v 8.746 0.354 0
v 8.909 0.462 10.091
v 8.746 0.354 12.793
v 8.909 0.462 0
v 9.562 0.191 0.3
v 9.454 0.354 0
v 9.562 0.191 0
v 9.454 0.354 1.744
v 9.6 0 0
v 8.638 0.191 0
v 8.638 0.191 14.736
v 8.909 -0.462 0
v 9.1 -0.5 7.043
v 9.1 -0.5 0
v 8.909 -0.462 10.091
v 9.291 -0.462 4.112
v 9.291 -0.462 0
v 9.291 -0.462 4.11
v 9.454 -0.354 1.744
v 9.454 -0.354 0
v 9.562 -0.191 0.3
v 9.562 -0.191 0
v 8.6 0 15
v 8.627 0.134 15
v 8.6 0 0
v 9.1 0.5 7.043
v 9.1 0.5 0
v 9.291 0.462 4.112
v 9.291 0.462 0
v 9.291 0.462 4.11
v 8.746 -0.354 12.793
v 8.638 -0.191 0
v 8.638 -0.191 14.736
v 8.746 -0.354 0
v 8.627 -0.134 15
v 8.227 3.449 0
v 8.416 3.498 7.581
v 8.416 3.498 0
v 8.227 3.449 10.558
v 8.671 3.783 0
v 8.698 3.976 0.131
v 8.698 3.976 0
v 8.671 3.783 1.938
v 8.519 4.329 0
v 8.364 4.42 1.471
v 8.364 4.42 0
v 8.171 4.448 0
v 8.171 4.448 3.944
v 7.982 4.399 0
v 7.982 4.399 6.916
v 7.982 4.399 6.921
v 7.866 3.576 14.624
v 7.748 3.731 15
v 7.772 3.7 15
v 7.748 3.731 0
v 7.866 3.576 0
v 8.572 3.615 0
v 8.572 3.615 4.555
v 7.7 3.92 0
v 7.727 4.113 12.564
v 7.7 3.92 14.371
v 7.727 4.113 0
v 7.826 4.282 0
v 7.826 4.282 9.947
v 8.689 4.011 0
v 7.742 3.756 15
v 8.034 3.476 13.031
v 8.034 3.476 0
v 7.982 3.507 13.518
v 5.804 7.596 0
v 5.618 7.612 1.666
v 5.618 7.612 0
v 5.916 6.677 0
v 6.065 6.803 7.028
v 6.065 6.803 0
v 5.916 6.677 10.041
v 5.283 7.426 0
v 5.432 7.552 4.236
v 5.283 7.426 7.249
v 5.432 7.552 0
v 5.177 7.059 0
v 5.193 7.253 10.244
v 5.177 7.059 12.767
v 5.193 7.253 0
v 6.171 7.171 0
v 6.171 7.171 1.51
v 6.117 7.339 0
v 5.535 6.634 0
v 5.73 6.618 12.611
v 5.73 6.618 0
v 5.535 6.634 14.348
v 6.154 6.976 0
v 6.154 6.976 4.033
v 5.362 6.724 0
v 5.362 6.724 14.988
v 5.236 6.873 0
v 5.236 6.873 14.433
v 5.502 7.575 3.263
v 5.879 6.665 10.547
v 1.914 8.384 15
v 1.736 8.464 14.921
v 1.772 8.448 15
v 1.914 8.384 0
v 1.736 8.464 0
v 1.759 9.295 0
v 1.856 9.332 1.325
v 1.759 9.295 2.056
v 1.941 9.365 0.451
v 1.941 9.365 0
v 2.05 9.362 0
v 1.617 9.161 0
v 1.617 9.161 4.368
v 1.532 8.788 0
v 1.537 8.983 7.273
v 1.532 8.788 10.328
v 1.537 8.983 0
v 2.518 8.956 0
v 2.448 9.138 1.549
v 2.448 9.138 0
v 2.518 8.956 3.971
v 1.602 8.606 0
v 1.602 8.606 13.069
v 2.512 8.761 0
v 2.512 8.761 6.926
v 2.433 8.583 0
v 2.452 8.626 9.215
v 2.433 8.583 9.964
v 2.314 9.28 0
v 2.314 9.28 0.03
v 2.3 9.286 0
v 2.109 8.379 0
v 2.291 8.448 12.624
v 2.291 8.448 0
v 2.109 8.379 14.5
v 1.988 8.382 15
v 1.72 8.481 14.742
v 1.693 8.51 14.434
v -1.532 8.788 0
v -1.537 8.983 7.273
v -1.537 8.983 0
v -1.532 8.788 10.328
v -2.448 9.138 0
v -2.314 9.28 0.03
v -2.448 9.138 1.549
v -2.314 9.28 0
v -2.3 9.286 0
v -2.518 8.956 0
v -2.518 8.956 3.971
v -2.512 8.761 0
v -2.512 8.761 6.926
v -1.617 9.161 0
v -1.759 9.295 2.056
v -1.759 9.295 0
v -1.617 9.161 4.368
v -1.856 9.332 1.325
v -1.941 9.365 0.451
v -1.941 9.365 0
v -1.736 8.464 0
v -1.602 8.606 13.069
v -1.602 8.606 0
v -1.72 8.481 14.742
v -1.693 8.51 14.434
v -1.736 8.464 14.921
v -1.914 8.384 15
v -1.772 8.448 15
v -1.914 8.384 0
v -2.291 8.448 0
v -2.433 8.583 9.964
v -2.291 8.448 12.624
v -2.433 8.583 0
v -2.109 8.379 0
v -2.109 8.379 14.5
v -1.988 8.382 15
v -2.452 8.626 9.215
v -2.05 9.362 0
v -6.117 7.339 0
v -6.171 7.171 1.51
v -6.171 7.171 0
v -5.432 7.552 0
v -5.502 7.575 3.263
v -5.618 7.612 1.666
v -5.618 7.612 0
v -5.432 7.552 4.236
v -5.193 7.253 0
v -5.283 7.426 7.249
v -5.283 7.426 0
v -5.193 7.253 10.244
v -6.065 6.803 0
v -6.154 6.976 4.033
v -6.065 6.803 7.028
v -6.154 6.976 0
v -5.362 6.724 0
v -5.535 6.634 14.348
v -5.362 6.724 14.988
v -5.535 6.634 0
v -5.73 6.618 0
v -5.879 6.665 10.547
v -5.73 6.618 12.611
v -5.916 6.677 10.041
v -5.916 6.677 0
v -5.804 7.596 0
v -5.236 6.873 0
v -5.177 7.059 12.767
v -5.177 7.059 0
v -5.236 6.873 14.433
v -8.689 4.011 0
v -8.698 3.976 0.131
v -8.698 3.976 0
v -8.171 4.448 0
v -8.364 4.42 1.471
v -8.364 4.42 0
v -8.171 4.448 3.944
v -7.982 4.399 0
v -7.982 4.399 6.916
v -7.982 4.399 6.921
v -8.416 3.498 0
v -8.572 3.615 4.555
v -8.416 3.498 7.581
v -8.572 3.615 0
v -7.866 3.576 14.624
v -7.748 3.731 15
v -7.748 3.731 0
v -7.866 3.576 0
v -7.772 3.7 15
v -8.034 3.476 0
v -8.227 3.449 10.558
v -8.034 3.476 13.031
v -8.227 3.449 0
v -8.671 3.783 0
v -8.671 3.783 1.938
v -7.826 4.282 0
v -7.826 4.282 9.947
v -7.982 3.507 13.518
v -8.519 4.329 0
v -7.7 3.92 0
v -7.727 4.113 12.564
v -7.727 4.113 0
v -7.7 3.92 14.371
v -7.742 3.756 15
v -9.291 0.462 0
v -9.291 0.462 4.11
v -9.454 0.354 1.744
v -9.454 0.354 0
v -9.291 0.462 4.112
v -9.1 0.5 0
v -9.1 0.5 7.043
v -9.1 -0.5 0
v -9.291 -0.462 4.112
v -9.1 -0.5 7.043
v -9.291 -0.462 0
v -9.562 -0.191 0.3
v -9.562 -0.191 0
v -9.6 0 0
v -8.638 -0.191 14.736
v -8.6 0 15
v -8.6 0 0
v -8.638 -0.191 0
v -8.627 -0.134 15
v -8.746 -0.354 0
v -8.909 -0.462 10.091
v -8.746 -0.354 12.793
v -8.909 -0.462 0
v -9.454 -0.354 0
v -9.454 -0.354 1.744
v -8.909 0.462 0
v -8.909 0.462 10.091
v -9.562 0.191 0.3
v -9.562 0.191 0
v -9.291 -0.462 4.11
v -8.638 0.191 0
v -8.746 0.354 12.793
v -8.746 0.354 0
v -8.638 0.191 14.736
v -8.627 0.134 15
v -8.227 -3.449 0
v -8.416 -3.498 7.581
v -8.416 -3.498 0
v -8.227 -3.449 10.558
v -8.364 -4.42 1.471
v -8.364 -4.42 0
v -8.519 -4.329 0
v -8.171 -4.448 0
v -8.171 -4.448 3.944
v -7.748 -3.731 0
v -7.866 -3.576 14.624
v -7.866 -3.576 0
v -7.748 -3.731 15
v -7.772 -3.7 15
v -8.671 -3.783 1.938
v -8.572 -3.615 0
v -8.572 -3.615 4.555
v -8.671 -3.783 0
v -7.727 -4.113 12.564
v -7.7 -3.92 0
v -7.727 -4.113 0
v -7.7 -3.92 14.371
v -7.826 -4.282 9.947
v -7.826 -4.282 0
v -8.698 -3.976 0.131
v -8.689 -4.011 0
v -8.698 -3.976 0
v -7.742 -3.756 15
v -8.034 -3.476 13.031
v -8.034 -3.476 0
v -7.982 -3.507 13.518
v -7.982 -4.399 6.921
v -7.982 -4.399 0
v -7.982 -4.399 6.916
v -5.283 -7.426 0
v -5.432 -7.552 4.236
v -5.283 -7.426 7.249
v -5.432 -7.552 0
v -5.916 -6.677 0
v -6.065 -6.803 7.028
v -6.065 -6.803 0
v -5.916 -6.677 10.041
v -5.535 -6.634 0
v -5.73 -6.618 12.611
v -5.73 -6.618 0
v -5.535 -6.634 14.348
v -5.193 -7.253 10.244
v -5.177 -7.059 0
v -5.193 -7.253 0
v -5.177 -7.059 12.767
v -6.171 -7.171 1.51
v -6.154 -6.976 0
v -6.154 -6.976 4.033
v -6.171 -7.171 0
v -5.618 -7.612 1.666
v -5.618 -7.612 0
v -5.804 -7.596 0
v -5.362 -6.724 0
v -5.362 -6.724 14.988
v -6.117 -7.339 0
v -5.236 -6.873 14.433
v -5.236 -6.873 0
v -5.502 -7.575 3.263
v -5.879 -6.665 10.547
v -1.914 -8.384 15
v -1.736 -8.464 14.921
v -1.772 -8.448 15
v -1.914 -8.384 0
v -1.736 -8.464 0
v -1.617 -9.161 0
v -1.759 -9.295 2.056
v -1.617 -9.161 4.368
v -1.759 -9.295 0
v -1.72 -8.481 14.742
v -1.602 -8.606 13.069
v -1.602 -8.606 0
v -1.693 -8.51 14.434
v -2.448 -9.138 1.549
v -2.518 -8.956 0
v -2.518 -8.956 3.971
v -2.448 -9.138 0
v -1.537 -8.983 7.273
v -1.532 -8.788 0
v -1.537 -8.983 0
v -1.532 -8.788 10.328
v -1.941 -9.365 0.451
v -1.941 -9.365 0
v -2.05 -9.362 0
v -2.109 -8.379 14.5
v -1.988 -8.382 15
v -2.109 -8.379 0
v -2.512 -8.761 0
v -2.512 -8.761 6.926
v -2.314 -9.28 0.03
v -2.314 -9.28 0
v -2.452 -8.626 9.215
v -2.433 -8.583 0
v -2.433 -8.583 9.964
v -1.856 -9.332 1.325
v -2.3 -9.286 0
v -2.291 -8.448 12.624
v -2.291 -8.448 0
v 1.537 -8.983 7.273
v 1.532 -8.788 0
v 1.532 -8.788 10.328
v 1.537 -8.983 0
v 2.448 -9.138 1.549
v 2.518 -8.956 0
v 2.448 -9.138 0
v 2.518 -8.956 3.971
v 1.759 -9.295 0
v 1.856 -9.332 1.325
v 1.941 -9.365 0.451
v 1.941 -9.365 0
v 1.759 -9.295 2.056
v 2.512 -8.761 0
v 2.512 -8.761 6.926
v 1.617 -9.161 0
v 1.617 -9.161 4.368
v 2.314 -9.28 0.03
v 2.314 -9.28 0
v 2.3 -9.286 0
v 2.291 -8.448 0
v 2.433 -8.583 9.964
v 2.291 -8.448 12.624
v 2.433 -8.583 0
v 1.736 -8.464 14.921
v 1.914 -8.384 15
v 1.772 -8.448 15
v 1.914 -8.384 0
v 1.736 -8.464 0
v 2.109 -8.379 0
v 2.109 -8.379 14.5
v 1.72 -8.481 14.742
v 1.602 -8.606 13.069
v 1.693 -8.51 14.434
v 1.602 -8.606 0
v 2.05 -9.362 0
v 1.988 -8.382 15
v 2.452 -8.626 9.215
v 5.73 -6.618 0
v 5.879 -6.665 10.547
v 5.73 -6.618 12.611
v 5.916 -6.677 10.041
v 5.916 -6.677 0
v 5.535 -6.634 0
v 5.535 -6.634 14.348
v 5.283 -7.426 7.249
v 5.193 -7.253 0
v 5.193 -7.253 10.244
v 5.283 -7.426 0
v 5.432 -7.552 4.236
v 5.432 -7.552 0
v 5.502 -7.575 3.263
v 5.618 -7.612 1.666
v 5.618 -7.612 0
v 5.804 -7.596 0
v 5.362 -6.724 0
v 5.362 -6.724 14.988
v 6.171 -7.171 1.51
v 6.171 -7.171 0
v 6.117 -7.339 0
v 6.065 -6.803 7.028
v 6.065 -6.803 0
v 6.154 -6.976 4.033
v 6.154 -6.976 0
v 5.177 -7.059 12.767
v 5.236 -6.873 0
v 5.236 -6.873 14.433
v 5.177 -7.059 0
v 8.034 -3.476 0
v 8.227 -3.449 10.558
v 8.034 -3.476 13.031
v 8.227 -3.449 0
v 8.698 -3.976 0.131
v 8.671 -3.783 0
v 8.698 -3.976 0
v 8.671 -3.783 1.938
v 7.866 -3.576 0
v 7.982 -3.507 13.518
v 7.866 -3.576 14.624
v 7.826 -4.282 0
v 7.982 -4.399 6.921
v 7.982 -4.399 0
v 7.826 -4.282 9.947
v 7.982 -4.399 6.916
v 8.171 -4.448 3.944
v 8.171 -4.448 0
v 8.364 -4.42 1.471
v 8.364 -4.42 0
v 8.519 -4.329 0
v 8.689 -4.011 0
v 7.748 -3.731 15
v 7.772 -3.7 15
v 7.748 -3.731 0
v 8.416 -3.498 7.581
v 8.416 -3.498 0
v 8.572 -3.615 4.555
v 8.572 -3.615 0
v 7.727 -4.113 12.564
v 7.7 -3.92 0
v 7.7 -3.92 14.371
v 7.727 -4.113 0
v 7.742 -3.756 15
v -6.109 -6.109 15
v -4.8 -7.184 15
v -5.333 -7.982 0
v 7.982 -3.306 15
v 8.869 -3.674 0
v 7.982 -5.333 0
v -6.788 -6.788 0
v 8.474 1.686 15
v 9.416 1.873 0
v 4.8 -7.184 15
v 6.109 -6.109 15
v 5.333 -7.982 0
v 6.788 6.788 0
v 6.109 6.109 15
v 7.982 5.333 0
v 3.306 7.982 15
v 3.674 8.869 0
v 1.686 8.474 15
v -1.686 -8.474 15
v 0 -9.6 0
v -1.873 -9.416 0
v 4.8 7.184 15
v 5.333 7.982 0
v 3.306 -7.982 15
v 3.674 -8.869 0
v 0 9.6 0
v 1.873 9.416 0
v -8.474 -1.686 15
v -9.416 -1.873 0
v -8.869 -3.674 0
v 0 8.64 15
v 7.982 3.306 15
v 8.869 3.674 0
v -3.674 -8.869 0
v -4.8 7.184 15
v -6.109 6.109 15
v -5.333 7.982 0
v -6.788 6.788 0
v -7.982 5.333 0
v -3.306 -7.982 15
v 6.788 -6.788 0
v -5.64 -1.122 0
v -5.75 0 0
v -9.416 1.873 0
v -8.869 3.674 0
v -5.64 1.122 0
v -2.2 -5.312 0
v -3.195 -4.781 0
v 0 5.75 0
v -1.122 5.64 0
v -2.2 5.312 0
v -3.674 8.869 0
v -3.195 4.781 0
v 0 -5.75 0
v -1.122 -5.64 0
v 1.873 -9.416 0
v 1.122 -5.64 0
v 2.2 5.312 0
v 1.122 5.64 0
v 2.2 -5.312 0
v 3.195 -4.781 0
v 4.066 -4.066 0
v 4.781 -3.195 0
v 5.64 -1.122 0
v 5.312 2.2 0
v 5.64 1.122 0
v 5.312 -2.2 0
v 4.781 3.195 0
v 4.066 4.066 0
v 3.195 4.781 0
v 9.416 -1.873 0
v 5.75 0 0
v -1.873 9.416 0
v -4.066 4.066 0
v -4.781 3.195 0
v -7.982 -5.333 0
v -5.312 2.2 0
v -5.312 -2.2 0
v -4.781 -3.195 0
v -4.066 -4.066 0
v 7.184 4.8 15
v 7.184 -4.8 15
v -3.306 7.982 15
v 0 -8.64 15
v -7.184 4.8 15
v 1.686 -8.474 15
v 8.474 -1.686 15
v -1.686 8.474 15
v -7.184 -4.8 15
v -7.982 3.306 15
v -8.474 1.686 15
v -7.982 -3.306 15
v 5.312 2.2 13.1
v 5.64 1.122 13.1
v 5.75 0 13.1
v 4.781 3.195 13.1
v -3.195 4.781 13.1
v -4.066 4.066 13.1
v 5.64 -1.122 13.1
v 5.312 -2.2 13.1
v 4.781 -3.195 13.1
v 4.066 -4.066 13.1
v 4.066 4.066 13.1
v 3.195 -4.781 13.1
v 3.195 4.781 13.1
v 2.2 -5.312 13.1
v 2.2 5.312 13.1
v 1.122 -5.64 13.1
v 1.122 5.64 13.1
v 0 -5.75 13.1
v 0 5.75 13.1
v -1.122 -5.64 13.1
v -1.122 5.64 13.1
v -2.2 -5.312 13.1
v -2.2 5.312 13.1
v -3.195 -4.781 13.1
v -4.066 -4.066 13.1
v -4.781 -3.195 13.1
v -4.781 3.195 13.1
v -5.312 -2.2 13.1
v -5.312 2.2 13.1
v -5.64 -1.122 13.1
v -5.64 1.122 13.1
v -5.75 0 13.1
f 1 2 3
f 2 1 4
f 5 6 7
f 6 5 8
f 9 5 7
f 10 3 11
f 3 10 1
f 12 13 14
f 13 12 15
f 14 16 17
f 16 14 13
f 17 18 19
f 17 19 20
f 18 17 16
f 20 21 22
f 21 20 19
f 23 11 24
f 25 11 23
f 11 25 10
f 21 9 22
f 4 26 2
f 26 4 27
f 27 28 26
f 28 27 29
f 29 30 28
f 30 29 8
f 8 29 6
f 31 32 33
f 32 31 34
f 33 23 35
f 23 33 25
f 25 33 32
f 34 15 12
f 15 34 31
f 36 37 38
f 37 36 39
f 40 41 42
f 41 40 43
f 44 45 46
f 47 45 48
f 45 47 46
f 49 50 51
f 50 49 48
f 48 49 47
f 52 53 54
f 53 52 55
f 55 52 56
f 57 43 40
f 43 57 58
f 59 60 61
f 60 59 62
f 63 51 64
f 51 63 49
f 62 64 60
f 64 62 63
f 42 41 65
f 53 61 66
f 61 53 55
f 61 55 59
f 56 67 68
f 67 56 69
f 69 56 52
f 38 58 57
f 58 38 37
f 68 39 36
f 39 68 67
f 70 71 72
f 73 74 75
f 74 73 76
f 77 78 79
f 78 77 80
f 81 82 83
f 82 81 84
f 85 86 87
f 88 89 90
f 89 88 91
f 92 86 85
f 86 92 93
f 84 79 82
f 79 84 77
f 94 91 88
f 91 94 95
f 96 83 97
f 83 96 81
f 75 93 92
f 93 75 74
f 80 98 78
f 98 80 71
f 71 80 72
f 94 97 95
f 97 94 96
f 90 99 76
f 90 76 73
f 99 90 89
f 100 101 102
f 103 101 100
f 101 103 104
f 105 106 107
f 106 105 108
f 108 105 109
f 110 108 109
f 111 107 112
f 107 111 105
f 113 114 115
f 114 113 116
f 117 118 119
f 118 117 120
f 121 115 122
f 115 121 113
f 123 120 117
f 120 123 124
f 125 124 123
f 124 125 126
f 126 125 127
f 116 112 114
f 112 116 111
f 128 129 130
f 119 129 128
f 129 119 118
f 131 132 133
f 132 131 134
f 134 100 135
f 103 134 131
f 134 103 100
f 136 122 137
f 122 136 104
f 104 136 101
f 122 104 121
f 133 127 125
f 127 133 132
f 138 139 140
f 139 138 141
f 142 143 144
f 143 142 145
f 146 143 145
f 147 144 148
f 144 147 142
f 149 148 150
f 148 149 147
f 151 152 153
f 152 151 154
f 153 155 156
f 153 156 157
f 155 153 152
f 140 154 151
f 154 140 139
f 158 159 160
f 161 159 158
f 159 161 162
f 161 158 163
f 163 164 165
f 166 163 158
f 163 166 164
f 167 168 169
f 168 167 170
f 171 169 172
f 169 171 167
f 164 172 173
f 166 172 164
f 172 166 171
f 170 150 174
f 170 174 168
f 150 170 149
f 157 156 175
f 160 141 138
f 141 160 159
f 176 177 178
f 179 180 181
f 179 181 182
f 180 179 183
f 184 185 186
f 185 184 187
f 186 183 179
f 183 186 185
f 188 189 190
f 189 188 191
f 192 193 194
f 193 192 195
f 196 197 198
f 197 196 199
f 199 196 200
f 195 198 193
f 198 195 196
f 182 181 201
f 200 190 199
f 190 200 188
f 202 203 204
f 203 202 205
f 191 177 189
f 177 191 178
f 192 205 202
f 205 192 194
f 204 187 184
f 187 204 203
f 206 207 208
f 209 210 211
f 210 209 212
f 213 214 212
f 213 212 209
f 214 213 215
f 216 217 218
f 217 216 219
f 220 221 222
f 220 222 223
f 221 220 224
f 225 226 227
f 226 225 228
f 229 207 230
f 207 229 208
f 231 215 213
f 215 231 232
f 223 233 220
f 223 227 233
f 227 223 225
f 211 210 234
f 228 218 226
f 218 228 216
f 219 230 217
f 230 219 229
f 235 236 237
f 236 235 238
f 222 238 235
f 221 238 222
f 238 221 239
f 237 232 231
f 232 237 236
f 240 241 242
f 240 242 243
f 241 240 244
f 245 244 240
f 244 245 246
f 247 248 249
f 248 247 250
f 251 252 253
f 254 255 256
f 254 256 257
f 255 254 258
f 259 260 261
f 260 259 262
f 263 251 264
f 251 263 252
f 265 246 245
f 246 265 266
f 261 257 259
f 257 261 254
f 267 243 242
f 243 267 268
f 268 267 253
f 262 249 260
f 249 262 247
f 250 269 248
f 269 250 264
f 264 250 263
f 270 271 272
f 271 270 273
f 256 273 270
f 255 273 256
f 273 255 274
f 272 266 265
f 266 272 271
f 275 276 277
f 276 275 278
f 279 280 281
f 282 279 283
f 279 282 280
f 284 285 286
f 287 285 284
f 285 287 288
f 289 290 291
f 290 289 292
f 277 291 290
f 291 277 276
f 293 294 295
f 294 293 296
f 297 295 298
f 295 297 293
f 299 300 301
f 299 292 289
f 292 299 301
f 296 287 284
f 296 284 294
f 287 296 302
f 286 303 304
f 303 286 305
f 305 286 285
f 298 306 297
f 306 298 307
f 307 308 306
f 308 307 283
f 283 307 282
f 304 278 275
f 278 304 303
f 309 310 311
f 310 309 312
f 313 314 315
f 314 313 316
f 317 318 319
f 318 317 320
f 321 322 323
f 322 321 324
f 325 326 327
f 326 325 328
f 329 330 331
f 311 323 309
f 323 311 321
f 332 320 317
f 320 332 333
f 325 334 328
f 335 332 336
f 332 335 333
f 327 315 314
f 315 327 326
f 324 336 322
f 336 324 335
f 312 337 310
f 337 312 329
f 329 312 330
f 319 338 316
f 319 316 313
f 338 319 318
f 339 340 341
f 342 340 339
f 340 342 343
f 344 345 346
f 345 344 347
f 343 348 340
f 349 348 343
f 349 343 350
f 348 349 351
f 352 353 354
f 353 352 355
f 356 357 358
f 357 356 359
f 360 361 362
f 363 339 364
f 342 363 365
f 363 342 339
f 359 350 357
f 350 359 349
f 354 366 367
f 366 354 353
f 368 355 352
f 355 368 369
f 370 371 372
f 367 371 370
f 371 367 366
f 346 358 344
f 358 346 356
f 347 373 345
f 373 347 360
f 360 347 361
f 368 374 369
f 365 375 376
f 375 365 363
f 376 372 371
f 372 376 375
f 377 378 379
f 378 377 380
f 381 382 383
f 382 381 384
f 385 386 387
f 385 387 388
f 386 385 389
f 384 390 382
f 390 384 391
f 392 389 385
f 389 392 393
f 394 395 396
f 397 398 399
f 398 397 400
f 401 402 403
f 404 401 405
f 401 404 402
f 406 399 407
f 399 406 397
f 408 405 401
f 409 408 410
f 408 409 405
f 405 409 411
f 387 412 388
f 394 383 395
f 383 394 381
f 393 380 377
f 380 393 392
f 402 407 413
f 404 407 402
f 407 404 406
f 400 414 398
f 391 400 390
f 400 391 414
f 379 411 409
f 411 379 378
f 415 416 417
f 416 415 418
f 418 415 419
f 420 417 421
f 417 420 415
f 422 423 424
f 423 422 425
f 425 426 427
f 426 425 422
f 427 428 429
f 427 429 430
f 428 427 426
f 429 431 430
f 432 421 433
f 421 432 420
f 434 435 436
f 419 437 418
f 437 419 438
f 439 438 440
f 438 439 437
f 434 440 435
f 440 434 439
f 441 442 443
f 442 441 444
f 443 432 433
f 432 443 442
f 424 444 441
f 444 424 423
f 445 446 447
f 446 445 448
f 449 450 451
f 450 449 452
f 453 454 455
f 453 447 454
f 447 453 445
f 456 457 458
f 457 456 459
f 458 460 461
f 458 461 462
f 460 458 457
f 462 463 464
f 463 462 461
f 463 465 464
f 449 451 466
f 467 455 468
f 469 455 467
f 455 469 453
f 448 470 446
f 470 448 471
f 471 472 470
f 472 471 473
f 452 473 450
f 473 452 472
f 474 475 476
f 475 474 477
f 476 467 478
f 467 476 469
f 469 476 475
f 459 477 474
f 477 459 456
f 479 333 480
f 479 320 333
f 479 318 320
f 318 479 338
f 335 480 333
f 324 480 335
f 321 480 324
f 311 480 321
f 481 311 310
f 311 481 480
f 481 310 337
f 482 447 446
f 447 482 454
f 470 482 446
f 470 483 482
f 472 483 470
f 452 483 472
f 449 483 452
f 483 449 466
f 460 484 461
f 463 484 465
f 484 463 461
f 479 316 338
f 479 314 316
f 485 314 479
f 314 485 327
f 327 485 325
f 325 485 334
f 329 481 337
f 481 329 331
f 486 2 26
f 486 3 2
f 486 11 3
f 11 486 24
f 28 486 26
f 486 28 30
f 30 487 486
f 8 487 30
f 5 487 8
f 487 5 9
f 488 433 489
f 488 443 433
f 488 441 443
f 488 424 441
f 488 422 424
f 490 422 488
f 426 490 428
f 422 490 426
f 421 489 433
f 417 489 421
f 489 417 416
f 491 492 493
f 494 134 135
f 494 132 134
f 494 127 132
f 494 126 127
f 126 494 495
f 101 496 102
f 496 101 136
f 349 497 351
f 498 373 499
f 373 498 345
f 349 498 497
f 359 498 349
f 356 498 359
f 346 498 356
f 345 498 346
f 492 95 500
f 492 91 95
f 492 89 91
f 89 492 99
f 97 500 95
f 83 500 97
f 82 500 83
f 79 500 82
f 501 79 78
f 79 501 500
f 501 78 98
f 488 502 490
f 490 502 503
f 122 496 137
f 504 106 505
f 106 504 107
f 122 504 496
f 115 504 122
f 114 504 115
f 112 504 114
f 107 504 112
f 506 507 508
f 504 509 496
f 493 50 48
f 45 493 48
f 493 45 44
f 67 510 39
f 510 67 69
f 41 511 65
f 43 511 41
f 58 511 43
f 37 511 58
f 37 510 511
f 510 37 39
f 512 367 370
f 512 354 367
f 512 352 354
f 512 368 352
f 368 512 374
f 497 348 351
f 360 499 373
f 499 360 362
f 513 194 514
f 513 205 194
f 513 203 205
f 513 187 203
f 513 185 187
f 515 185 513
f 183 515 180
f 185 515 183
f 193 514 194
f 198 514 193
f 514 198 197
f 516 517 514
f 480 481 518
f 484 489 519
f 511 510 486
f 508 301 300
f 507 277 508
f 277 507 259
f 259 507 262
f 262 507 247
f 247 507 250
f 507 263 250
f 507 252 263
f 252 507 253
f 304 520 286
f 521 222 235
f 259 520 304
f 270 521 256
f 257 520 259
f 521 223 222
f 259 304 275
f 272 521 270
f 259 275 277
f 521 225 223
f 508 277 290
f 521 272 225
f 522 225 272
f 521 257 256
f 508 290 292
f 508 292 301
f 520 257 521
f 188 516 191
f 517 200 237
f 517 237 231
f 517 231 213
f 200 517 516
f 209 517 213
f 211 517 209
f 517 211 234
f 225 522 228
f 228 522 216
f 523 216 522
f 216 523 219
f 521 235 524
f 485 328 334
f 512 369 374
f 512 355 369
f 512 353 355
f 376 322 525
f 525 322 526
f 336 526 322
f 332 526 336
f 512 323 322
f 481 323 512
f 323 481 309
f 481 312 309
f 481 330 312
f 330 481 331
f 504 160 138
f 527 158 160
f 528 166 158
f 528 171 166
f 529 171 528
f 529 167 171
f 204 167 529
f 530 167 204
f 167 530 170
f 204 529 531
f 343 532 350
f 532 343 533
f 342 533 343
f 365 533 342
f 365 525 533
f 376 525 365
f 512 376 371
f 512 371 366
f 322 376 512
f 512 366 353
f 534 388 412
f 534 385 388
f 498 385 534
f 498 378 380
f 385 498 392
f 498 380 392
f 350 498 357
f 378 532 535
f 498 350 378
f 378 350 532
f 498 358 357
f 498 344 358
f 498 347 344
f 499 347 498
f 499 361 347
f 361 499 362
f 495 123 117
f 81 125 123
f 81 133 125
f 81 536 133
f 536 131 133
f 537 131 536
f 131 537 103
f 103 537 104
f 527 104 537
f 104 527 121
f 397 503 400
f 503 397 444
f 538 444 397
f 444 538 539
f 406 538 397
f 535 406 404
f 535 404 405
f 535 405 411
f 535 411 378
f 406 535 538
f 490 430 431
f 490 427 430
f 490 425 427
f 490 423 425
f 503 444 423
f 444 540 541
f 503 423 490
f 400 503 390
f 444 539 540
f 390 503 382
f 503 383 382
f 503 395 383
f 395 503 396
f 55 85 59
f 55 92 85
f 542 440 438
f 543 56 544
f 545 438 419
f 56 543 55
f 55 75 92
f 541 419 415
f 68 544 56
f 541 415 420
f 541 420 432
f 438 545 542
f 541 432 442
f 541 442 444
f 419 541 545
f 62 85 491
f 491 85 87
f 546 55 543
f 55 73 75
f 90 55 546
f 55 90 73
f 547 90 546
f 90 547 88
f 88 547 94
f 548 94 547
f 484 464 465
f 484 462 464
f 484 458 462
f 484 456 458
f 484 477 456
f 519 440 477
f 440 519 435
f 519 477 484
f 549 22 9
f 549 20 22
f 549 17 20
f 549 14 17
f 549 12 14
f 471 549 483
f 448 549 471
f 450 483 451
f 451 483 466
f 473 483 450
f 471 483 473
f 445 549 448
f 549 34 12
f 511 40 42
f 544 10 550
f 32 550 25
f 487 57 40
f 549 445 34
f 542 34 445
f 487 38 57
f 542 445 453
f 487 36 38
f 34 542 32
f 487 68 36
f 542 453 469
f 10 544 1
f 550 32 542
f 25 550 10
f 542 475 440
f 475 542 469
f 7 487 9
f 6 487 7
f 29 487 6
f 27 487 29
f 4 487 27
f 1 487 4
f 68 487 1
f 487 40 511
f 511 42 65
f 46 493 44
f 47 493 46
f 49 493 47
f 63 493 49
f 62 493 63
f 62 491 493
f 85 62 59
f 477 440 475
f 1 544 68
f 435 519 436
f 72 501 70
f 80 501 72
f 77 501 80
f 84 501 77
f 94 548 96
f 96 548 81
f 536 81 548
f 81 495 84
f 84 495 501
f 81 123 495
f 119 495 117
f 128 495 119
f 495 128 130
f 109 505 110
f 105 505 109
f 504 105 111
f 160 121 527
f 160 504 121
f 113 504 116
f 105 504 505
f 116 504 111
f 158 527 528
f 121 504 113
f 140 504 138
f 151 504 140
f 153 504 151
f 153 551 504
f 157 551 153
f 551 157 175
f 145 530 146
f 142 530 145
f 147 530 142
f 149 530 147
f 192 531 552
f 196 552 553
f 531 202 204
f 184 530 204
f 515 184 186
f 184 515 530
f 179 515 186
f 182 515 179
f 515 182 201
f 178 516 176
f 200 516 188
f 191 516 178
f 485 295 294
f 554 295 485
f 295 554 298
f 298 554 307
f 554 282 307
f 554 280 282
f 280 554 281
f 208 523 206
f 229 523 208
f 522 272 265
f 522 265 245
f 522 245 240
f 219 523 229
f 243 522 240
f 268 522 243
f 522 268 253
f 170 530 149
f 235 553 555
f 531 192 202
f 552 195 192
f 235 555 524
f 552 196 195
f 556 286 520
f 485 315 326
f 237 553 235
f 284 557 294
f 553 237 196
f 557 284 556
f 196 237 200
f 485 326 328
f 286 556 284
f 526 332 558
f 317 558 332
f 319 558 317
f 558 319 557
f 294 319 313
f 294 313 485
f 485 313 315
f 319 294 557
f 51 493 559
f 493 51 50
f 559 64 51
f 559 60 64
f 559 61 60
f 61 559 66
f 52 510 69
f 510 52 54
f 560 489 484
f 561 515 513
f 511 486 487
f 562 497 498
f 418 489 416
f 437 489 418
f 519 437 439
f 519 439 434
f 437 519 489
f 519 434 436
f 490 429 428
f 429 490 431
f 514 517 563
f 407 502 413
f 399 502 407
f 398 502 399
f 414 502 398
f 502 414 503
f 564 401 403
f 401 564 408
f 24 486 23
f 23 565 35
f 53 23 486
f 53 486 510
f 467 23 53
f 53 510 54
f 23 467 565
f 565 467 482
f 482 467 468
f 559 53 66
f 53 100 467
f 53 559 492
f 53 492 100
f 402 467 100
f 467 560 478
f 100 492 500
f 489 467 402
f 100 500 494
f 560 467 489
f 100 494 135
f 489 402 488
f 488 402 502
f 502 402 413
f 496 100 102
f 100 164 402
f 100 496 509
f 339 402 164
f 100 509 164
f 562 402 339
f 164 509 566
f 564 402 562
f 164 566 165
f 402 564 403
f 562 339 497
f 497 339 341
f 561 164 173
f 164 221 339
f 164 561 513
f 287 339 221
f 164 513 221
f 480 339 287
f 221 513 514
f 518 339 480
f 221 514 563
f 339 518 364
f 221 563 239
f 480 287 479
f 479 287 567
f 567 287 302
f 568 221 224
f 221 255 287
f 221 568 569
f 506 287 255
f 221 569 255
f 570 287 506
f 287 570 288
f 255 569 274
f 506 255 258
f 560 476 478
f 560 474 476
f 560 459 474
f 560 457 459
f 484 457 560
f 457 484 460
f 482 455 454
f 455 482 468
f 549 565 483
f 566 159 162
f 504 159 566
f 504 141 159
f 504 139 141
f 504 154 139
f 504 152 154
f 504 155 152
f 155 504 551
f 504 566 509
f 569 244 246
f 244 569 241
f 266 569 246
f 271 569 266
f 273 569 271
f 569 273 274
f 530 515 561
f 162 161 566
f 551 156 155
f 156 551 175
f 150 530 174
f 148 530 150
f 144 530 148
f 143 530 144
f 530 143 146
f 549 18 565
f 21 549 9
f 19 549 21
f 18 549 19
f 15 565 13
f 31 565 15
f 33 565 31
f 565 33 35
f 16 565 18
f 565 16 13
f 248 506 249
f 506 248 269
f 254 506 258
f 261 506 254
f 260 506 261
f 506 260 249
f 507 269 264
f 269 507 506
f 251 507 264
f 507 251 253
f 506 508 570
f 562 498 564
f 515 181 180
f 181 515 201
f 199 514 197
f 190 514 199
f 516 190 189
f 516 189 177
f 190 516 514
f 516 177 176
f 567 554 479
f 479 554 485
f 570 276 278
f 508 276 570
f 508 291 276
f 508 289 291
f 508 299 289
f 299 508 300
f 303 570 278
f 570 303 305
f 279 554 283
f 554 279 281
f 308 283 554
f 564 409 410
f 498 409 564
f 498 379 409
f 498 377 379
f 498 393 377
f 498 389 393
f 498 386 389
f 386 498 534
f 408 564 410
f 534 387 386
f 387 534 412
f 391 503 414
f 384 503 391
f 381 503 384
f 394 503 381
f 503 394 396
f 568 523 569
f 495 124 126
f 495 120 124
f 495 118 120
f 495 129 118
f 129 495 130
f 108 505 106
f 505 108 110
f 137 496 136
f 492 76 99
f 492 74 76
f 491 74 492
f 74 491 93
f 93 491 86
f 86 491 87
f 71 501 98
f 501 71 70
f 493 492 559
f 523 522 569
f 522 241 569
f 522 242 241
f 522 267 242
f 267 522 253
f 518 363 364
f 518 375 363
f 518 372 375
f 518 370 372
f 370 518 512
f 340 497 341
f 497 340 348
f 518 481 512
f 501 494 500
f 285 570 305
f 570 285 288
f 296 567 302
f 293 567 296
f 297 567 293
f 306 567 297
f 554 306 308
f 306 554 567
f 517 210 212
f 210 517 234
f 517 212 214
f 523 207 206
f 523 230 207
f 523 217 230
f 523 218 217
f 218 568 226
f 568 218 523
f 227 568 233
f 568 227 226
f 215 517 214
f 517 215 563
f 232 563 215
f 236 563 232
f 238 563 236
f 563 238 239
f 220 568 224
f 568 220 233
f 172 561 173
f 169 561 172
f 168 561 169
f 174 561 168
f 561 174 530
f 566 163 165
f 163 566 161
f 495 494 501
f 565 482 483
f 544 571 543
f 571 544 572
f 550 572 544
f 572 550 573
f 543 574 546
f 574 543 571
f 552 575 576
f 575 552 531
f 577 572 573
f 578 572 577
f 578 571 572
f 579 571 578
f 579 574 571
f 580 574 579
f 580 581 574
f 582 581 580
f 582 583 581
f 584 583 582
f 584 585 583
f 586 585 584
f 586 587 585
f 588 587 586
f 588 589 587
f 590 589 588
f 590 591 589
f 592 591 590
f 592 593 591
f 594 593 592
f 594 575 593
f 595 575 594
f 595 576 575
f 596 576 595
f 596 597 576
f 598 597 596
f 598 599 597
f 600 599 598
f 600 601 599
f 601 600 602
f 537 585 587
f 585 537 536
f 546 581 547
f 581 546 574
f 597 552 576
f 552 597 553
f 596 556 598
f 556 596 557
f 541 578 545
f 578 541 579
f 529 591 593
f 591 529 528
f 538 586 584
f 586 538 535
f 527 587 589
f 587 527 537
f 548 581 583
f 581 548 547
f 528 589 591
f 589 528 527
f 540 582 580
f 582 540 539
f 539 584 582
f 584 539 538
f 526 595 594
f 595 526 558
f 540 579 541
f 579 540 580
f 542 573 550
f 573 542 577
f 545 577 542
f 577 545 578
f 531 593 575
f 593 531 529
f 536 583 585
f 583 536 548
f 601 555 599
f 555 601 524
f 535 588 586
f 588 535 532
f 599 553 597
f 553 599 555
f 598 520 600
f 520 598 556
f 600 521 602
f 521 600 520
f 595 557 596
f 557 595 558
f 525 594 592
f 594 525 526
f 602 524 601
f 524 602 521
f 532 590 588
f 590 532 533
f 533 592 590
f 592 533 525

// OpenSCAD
// ACCESS KNOB — Shruthi XT Hybrid Monosynth Knob (Slip-On Sleeve)
// Generated via CLI for Studio Knobs (Slip-On Sleeve)
module access_knob_shruthi_xt_slipon() {
  outer_d = 19.2;
  height = 15;
  taper = 0.9;
  bore_d = 11.2;
  slot_h = 13;
  tex_depth = 1;
  tex_scale = 1;
  tex_count = 14;

  difference() {
    cylinder(h=height, d1=outer_d, d2=outer_d*taper, $fn=32);
    translate([0,0,-0.1]) cylinder(h=slot_h+0.2, d=bore_d + 0.3, $fn=32);
    for(i=[0:tex_count-1]) {
      rotate([0,0,i*(360/tex_count)])
        translate([outer_d/2-tex_depth/2, 0, height/2])
          cylinder(h=height*1.1, d=tex_scale, center=true, $fn=16);
    }
  }
}
access_knob_shruthi_xt_slipon();
